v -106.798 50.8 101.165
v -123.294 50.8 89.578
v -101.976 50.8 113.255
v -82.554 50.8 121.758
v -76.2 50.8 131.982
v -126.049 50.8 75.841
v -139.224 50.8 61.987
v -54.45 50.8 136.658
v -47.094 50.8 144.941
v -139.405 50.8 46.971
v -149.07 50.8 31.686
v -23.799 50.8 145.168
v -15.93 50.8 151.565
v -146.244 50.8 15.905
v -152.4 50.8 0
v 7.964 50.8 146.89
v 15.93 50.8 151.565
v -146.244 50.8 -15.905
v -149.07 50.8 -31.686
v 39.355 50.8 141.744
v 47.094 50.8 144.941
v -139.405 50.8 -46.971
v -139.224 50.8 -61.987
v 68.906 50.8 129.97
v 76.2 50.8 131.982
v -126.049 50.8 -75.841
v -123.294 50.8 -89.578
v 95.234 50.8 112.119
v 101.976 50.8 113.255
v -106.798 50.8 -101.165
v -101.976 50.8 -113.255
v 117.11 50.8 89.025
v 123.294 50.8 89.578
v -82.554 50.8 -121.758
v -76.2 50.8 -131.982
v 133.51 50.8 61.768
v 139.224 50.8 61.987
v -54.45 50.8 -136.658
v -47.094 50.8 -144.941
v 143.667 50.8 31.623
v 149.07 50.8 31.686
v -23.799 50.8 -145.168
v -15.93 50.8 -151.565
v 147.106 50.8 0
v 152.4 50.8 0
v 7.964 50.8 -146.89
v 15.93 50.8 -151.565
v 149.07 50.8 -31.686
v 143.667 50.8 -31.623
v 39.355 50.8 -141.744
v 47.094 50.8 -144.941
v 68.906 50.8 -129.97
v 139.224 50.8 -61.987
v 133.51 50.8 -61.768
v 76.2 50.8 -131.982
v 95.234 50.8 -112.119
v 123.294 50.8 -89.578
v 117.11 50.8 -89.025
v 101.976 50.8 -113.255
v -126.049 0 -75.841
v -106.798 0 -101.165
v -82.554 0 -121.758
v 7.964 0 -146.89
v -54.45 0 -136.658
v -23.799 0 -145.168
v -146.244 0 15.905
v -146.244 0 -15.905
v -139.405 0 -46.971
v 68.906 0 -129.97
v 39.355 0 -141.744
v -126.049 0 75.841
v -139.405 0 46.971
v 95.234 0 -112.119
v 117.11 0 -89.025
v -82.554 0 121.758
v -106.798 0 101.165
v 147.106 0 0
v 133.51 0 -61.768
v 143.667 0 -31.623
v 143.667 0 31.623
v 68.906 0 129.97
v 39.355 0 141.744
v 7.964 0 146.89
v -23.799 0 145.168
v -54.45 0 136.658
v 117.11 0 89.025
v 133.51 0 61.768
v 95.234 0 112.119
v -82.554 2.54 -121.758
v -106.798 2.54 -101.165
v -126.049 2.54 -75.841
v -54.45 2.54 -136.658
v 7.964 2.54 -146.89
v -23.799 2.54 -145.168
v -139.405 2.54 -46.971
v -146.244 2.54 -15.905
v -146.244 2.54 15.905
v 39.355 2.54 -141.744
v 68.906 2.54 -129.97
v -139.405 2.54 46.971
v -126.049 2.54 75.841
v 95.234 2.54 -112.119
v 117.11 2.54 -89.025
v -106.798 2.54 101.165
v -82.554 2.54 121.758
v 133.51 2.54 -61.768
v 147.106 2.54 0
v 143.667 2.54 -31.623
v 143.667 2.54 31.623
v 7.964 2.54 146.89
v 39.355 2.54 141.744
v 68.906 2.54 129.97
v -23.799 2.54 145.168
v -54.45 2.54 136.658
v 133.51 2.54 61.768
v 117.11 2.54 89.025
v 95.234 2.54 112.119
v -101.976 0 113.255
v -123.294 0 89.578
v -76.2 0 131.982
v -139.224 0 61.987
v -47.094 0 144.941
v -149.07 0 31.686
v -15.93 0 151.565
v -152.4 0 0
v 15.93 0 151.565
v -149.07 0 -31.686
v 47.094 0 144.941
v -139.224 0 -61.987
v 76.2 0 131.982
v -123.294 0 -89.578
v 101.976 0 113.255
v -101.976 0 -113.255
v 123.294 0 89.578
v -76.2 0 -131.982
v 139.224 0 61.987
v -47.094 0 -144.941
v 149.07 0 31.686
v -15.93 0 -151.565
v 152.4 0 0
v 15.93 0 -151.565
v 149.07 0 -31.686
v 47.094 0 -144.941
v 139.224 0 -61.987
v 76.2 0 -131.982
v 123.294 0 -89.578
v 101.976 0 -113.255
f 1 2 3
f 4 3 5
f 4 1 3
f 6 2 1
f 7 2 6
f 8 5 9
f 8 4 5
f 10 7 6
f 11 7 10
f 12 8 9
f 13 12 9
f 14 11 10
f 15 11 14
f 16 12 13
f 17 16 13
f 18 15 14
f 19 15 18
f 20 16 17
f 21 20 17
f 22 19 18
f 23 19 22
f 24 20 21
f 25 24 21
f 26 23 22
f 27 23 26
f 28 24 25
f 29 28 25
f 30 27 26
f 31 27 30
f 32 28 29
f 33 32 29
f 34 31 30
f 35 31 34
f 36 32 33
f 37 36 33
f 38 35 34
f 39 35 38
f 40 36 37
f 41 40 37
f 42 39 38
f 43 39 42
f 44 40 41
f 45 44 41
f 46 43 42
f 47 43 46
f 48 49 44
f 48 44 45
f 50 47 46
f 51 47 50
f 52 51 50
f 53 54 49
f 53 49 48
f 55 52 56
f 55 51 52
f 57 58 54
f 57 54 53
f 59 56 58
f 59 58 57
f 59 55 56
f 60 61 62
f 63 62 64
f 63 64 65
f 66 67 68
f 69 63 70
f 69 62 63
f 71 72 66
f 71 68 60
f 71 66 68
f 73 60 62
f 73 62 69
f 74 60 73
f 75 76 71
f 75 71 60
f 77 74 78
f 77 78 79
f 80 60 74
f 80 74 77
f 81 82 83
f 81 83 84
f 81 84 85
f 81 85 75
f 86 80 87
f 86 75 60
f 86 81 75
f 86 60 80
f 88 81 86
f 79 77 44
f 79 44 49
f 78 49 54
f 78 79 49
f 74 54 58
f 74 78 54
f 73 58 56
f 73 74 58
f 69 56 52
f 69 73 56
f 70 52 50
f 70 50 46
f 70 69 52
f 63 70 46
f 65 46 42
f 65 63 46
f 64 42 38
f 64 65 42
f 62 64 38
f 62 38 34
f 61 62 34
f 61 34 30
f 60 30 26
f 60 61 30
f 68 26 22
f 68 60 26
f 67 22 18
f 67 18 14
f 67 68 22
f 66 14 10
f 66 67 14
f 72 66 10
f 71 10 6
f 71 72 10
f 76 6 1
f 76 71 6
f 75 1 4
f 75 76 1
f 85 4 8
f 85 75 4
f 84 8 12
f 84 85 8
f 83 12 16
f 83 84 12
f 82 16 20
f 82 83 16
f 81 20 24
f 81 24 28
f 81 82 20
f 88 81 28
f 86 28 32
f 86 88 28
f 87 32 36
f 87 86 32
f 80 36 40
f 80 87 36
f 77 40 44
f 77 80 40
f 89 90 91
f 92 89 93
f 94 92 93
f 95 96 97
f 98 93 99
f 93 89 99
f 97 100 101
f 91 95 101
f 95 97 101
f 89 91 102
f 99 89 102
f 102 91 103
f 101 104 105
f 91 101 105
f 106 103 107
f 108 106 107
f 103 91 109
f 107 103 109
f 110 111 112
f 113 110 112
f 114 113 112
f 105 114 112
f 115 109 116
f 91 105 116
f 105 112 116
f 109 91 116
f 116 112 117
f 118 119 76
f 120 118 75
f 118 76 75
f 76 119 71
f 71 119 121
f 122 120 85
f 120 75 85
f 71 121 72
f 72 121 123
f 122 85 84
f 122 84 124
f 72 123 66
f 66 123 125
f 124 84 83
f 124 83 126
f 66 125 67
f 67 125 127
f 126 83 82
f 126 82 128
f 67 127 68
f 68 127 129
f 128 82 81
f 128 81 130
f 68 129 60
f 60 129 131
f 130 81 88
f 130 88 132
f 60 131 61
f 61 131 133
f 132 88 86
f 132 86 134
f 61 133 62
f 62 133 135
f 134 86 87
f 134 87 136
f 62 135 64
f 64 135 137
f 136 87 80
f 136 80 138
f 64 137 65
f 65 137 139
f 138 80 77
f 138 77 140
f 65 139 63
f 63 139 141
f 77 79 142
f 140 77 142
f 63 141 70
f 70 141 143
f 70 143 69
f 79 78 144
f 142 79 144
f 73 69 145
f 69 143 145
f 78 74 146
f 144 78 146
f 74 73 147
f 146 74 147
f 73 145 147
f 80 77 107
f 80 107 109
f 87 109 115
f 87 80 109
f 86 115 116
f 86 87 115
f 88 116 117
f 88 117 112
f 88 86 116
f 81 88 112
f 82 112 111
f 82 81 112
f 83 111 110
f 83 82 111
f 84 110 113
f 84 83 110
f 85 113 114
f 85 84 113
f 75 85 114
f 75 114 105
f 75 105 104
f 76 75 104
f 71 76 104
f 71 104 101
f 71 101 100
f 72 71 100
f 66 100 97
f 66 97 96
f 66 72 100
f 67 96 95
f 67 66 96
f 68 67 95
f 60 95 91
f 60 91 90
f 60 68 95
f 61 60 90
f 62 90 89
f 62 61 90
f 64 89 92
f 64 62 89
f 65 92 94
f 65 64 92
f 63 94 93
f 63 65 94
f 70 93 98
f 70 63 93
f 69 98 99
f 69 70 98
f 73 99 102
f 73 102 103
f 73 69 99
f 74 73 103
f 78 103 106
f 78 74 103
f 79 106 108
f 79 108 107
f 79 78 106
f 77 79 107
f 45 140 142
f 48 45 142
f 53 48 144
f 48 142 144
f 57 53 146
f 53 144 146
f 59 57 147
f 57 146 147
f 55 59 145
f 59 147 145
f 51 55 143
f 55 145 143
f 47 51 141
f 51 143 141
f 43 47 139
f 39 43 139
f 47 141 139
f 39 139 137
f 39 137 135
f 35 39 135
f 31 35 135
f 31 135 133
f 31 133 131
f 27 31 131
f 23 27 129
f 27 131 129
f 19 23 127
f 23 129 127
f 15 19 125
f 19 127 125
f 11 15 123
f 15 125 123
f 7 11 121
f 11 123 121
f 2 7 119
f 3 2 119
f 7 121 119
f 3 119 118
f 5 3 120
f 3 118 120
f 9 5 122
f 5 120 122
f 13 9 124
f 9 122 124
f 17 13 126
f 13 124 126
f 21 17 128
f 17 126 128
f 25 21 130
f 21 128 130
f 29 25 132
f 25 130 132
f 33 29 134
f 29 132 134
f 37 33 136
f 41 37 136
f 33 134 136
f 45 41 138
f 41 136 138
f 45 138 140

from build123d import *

# Parameters (mm, degrees)
SKETCH1_R           = 152.4
SKETCH1_R_2         = 147.105988381
BOSS_EXTRUDE1_DEPTH = 50.8
SKETCH3_R           = 147.105988381
BOSS_EXTRUDE2_DEPTH = 2.54


with BuildPart() as part:
    # Sketch1 → Boss-Extrude1 (new body)
    with BuildSketch(Plane(origin=(0, 0, 0), x_dir=(1, 0, 0), z_dir=(0, 1, 0))):
        Circle(SKETCH1_R)
        Circle(SKETCH1_R_2, mode=Mode.SUBTRACT)
    extrude(amount=BOSS_EXTRUDE1_DEPTH)


with BuildPart() as body_2:
    # Sketch3 → Boss-Extrude2 (new body)
    with BuildSketch(Plane.XZ):
        Circle(SKETCH3_R)
    extrude(amount=-BOSS_EXTRUDE2_DEPTH)


solid = Compound([part.part, body_2.part])
